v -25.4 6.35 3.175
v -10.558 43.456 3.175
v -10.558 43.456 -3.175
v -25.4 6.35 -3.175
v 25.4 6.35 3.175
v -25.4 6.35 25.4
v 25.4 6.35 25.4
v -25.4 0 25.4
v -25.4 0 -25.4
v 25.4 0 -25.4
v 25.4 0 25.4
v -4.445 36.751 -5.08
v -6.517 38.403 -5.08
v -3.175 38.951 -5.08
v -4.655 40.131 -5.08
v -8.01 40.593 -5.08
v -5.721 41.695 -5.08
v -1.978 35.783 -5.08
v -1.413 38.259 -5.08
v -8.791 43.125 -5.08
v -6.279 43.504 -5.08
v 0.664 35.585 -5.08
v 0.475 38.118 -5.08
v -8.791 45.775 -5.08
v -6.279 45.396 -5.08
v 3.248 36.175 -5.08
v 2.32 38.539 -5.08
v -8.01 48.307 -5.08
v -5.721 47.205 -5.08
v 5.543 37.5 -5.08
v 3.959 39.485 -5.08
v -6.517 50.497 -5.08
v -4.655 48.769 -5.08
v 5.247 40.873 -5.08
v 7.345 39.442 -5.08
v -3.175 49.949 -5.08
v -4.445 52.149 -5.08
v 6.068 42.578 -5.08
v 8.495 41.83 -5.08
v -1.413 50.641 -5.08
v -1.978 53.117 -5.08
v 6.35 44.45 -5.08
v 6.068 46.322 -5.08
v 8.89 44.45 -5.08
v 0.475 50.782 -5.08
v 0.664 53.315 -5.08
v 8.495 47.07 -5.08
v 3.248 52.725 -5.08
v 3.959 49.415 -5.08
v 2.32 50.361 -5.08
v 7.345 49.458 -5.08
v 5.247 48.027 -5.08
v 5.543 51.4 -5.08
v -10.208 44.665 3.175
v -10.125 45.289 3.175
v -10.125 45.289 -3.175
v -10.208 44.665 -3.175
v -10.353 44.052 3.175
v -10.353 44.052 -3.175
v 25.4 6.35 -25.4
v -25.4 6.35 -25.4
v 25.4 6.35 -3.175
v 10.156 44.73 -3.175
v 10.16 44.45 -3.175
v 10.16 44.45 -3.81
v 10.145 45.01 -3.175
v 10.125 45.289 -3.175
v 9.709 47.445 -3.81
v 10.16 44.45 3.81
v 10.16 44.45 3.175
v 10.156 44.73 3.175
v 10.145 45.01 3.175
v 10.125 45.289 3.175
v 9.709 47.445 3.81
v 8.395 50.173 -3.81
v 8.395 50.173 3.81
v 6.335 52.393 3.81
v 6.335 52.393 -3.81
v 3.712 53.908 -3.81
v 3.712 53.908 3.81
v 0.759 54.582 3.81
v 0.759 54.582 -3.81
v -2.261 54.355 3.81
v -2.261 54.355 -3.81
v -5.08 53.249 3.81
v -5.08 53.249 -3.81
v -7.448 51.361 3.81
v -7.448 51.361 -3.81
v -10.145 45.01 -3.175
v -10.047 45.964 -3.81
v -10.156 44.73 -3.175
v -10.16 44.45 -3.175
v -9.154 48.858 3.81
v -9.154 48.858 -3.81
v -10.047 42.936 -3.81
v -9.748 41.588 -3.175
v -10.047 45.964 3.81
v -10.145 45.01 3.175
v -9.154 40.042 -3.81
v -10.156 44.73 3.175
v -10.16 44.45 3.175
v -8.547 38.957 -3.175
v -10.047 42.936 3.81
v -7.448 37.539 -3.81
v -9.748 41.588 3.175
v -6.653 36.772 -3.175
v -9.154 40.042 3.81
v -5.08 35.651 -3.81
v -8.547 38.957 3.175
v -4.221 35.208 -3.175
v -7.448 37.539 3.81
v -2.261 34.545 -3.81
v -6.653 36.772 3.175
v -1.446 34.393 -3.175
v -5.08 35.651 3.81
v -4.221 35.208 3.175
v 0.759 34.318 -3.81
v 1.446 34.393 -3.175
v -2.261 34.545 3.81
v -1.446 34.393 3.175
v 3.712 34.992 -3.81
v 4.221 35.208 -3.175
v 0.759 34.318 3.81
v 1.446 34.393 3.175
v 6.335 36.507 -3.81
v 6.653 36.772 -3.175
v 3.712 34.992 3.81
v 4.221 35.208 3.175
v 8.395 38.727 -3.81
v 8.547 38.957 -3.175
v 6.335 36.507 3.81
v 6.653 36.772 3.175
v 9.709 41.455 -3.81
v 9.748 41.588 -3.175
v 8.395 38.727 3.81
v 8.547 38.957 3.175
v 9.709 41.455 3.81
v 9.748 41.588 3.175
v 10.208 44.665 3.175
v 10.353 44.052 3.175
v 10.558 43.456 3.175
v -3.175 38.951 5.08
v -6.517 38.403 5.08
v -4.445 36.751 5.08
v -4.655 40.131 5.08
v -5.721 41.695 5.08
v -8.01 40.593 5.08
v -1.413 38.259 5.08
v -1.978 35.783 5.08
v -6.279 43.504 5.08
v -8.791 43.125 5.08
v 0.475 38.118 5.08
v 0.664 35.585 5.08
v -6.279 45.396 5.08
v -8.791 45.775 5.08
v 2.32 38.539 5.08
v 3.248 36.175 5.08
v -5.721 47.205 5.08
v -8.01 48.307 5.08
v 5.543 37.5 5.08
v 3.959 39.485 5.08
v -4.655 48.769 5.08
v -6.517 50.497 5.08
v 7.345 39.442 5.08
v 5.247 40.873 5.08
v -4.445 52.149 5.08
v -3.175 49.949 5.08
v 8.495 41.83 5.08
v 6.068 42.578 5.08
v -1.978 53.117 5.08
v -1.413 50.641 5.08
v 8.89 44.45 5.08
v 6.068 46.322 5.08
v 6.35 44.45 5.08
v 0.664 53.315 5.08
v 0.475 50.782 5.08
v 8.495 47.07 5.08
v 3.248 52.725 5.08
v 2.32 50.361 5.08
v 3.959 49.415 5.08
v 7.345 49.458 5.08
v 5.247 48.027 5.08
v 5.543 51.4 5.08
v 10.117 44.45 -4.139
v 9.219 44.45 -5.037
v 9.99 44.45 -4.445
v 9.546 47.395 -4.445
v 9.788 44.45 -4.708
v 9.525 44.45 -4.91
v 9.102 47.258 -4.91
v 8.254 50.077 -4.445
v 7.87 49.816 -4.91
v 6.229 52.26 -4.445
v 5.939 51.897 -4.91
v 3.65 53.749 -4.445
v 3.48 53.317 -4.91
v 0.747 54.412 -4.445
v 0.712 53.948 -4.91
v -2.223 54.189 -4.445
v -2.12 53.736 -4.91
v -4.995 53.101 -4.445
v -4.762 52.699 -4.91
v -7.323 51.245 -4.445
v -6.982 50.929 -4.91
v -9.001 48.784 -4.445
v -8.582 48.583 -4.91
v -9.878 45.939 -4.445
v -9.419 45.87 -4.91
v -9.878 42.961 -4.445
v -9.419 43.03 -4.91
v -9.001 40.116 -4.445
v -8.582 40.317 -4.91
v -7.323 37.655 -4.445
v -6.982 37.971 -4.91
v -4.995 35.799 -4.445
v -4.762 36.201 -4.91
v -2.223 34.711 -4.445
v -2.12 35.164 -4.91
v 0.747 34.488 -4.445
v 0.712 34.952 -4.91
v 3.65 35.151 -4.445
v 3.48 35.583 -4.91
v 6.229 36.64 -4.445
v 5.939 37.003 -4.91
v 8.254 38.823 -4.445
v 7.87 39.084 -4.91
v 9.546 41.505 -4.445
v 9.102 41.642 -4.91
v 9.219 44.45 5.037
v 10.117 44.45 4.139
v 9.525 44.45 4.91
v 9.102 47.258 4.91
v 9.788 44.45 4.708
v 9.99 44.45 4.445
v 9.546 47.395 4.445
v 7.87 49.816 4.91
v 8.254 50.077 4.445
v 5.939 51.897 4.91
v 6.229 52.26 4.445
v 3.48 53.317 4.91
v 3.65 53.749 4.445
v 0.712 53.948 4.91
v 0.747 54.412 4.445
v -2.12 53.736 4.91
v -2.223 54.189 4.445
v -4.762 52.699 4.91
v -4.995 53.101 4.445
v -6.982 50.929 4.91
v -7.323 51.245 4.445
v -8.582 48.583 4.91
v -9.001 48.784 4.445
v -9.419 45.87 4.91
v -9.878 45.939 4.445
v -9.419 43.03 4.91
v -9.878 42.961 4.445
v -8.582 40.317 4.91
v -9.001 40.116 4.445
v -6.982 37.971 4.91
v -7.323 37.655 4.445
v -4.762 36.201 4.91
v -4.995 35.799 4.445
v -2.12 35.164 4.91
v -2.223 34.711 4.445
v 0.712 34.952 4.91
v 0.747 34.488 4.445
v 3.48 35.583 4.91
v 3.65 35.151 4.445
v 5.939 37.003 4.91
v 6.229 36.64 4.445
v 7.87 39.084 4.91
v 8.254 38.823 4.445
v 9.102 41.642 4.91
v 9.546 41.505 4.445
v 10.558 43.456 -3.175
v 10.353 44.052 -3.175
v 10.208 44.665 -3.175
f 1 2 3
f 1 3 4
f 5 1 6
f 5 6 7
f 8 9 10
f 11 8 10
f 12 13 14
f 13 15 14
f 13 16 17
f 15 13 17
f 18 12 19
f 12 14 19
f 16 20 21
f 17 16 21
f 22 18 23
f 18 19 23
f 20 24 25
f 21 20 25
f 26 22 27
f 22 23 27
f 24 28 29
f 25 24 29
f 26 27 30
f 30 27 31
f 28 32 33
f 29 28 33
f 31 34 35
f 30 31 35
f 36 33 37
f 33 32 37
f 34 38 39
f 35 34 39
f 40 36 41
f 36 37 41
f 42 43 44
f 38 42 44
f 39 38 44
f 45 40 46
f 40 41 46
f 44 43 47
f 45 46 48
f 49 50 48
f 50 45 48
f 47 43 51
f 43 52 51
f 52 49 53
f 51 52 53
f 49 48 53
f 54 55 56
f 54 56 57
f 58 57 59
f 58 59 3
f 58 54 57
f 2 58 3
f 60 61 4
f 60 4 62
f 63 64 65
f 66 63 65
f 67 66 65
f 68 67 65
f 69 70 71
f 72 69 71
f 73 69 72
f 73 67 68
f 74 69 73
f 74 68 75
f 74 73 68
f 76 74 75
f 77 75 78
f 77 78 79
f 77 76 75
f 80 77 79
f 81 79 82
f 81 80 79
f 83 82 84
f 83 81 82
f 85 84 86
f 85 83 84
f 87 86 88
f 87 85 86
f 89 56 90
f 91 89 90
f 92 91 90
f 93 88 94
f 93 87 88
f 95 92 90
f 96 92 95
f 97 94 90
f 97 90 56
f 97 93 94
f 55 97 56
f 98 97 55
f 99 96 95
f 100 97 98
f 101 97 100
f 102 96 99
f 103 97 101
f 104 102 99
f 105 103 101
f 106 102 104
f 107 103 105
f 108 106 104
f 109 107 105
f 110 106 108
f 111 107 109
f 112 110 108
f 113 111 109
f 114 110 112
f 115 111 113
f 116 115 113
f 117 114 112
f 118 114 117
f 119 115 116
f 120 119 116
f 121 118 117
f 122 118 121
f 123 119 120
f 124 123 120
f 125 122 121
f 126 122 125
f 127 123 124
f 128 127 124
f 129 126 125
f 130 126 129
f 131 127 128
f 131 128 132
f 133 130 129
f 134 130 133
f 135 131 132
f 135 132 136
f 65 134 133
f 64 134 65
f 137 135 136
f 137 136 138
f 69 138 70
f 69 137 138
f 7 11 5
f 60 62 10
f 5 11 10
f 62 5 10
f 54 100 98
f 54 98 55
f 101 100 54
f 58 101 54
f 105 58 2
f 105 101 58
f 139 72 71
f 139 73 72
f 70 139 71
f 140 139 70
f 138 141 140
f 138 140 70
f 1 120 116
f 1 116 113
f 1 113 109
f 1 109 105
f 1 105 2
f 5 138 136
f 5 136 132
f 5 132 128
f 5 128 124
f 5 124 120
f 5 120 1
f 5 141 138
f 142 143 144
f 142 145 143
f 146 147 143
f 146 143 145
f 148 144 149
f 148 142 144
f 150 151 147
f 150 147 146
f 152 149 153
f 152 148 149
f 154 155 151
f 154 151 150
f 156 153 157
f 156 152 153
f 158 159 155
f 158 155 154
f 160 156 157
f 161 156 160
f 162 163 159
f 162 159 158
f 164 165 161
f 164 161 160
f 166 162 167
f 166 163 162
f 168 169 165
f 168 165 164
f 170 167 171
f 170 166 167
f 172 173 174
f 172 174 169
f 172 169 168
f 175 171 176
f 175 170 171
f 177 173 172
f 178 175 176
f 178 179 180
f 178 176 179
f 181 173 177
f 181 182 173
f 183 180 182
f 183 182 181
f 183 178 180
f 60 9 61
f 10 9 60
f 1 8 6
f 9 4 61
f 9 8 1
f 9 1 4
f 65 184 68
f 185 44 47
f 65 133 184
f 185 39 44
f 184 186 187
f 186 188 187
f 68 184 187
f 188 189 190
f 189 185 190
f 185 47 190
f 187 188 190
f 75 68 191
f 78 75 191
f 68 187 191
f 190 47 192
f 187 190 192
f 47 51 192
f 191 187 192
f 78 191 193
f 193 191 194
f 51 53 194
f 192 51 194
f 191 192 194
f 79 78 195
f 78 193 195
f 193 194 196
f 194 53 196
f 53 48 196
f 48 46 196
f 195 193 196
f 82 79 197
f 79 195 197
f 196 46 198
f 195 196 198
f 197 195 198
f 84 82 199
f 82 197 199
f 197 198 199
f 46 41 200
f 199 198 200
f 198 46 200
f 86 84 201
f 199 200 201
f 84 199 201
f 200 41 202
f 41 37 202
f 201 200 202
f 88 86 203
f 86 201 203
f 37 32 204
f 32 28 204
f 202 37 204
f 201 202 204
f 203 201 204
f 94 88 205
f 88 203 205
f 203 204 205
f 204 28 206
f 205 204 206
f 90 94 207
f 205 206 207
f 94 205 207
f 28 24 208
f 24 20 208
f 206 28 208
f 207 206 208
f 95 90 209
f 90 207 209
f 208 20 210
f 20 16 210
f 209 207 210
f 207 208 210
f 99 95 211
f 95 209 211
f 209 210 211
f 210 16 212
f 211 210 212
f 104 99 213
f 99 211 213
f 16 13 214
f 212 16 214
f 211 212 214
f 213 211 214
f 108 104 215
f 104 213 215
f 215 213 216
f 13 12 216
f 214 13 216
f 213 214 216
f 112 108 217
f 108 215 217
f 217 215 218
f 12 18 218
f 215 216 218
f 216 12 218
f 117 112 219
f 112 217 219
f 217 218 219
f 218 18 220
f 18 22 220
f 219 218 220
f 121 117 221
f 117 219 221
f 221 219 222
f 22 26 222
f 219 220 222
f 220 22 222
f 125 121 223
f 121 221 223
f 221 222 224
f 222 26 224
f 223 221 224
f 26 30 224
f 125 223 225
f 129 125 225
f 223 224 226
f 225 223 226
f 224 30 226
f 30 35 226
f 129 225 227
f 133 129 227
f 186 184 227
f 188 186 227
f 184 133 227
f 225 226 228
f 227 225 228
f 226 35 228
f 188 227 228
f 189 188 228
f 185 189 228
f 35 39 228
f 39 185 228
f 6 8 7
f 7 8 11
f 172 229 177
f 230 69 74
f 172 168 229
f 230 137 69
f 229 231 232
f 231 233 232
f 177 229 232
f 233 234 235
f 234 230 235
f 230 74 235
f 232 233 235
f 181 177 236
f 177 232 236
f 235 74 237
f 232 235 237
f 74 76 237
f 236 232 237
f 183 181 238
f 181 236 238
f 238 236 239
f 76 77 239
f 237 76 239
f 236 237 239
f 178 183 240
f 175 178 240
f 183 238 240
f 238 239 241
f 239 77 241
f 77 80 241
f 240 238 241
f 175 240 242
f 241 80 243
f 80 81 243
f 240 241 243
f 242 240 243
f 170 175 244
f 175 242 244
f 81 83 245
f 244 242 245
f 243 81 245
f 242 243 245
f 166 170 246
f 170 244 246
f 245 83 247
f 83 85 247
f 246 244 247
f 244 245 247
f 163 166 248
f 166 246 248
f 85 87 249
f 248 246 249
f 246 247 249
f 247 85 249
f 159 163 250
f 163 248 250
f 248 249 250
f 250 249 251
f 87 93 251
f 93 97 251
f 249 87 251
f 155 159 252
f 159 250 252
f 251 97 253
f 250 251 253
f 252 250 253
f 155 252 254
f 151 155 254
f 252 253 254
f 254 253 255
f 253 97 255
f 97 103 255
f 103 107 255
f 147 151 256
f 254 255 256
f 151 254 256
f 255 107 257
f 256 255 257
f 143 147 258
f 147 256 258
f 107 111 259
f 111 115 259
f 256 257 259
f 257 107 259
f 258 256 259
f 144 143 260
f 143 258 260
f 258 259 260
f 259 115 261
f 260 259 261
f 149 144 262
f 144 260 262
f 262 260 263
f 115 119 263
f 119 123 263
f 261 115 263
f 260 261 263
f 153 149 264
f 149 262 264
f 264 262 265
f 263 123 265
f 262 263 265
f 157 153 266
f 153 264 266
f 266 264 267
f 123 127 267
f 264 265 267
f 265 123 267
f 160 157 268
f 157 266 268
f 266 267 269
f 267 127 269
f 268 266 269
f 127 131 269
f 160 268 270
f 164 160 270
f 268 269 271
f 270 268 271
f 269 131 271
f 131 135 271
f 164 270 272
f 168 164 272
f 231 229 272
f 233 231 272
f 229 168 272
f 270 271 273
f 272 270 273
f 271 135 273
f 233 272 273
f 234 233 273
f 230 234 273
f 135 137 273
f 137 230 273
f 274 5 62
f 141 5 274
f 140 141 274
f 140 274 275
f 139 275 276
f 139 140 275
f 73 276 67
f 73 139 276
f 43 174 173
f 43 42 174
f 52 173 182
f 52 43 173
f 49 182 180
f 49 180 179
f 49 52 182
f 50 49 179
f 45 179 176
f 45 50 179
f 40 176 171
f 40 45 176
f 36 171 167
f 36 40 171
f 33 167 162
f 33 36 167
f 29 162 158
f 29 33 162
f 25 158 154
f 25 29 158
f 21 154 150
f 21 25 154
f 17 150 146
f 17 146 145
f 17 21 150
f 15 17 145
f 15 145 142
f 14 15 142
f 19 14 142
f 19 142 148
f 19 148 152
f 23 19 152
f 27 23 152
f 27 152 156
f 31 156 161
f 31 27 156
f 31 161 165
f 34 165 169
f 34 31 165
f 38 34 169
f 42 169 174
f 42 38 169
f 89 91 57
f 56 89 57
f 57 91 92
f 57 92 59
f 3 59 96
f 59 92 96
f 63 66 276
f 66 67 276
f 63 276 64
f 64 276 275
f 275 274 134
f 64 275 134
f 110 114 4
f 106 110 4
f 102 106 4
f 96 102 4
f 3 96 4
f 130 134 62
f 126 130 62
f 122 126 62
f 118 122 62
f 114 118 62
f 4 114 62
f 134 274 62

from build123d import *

# Parameters (mm, degrees)
SKETCH1_W           = 50.8
SKETCH1_H           = 50.8
BOSS_EXTRUDE1_DEPTH = 6.35
SKETCH2_R           = 10.16
SKETCH2_R_2         = 6.35
BOSS_EXTRUDE2_DEPTH = 5.08
BOSS_EXTRUDE3_DEPTH = 3.175
FILLET3_R           = 6.35


with BuildPart() as part:
    # Sketch1 → Boss-Extrude1 (new body)
    with BuildSketch(Plane(origin=(0, 0, 0), x_dir=(1, 0, 0), z_dir=(0, 1, 0))):
        Rectangle(SKETCH1_W, SKETCH1_H)
    extrude(amount=BOSS_EXTRUDE1_DEPTH)



with BuildPart() as body_2:
    # Sketch2 → Boss-Extrude2 (new, symmetric)
    with BuildSketch(Plane.XY):
        with Locations((0, 44.45)):
            Circle(SKETCH2_R)
        with Locations((0, 44.45)):
            Circle(SKETCH2_R_2, mode=Mode.SUBTRACT)
    extrude(amount=BOSS_EXTRUDE2_DEPTH, both=True)


with BuildPart() as part_1:
    add(part.part)

    add(body_2.part)  # Boss-Extrude3 merges body 2
    # Sketch4 → Boss-Extrude3 (add, symmetric)
    with BuildSketch(Plane.XY):
        with BuildLine():
            Line((-10.16, 44.45), (-25.4, 6.35))
            Line((-25.4, 6.35), (25.4, 6.35))
            Line((25.4, 6.35), (10.16, 44.45))
            ThreePointArc((10.16, 44.45), (0, 34.29), (-10.16, 44.45))
        make_face()
    extrude(amount=BOSS_EXTRUDE3_DEPTH, both=True)

    # Fillet2: read off the stored shape, not the designer's step
    # Fillet2 outline → Fillet2 (revolve, cut)
    with BuildSketch(Plane.XZ.offset(-44.45)):
        with BuildLine():
            ThreePointArc((10.16, -3.81), (9.788025612, -4.708025612), (8.89, -5.08))
            Line((8.89, -5.08), (10.16, -5.08))
            Line((10.16, -5.08), (10.16, -3.81))
        make_face()
        with BuildLine():
            ThreePointArc((8.89, 5.08), (9.788025612, 4.708025612), (10.16, 3.81))
            Line((10.16, 3.81), (10.16, 5.08))
            Line((10.16, 5.08), (8.89, 5.08))
        make_face()
    revolve(axis=Axis((0, 44.45, 0), (0, 0, 1)), mode=Mode.SUBTRACT)

    # Fillet3
    # the kernel refuses this fillet: 6.35 mm, written as the material it adds along each edge
    with BuildSketch(Plane(origin=(10.16, 44.45, 3.175), x_dir=(-0.041343675933645734, 0.9991449847045691, 0), z_dir=(0, 0, -1))) as fillet3_piece_1:
        with BuildLine():
            CenterArc((1.102635837, 6.344570653), FILLET3_R, 250.56808401, 17.062422493)
            Line((-1.009923388, 0.356282624), (0, 0))
            ThreePointArc((0, 0), (0.420051747, 0.008686955), (0.840103495, 0))
        make_face()
    extrude(amount=6.35)
    with BuildSketch(Plane(origin=(-10.16, 44.45, 3.175), x_dir=(0.04134367593364538, 0.9991449847045691, 0), z_dir=(0, 0, -1))) as fillet3_piece_2:
        with BuildLine():
            CenterArc((1.102635837, -6.344570653), FILLET3_R, 92.369493497, 17.062422493)
            Line((-1.009923388, -0.356282624), (0, 0))
            ThreePointArc((0, 0), (0.420051747, -0.008686955), (0.840103495, 0))
        make_face()
    extrude(amount=6.35)


solid = part_1.part
